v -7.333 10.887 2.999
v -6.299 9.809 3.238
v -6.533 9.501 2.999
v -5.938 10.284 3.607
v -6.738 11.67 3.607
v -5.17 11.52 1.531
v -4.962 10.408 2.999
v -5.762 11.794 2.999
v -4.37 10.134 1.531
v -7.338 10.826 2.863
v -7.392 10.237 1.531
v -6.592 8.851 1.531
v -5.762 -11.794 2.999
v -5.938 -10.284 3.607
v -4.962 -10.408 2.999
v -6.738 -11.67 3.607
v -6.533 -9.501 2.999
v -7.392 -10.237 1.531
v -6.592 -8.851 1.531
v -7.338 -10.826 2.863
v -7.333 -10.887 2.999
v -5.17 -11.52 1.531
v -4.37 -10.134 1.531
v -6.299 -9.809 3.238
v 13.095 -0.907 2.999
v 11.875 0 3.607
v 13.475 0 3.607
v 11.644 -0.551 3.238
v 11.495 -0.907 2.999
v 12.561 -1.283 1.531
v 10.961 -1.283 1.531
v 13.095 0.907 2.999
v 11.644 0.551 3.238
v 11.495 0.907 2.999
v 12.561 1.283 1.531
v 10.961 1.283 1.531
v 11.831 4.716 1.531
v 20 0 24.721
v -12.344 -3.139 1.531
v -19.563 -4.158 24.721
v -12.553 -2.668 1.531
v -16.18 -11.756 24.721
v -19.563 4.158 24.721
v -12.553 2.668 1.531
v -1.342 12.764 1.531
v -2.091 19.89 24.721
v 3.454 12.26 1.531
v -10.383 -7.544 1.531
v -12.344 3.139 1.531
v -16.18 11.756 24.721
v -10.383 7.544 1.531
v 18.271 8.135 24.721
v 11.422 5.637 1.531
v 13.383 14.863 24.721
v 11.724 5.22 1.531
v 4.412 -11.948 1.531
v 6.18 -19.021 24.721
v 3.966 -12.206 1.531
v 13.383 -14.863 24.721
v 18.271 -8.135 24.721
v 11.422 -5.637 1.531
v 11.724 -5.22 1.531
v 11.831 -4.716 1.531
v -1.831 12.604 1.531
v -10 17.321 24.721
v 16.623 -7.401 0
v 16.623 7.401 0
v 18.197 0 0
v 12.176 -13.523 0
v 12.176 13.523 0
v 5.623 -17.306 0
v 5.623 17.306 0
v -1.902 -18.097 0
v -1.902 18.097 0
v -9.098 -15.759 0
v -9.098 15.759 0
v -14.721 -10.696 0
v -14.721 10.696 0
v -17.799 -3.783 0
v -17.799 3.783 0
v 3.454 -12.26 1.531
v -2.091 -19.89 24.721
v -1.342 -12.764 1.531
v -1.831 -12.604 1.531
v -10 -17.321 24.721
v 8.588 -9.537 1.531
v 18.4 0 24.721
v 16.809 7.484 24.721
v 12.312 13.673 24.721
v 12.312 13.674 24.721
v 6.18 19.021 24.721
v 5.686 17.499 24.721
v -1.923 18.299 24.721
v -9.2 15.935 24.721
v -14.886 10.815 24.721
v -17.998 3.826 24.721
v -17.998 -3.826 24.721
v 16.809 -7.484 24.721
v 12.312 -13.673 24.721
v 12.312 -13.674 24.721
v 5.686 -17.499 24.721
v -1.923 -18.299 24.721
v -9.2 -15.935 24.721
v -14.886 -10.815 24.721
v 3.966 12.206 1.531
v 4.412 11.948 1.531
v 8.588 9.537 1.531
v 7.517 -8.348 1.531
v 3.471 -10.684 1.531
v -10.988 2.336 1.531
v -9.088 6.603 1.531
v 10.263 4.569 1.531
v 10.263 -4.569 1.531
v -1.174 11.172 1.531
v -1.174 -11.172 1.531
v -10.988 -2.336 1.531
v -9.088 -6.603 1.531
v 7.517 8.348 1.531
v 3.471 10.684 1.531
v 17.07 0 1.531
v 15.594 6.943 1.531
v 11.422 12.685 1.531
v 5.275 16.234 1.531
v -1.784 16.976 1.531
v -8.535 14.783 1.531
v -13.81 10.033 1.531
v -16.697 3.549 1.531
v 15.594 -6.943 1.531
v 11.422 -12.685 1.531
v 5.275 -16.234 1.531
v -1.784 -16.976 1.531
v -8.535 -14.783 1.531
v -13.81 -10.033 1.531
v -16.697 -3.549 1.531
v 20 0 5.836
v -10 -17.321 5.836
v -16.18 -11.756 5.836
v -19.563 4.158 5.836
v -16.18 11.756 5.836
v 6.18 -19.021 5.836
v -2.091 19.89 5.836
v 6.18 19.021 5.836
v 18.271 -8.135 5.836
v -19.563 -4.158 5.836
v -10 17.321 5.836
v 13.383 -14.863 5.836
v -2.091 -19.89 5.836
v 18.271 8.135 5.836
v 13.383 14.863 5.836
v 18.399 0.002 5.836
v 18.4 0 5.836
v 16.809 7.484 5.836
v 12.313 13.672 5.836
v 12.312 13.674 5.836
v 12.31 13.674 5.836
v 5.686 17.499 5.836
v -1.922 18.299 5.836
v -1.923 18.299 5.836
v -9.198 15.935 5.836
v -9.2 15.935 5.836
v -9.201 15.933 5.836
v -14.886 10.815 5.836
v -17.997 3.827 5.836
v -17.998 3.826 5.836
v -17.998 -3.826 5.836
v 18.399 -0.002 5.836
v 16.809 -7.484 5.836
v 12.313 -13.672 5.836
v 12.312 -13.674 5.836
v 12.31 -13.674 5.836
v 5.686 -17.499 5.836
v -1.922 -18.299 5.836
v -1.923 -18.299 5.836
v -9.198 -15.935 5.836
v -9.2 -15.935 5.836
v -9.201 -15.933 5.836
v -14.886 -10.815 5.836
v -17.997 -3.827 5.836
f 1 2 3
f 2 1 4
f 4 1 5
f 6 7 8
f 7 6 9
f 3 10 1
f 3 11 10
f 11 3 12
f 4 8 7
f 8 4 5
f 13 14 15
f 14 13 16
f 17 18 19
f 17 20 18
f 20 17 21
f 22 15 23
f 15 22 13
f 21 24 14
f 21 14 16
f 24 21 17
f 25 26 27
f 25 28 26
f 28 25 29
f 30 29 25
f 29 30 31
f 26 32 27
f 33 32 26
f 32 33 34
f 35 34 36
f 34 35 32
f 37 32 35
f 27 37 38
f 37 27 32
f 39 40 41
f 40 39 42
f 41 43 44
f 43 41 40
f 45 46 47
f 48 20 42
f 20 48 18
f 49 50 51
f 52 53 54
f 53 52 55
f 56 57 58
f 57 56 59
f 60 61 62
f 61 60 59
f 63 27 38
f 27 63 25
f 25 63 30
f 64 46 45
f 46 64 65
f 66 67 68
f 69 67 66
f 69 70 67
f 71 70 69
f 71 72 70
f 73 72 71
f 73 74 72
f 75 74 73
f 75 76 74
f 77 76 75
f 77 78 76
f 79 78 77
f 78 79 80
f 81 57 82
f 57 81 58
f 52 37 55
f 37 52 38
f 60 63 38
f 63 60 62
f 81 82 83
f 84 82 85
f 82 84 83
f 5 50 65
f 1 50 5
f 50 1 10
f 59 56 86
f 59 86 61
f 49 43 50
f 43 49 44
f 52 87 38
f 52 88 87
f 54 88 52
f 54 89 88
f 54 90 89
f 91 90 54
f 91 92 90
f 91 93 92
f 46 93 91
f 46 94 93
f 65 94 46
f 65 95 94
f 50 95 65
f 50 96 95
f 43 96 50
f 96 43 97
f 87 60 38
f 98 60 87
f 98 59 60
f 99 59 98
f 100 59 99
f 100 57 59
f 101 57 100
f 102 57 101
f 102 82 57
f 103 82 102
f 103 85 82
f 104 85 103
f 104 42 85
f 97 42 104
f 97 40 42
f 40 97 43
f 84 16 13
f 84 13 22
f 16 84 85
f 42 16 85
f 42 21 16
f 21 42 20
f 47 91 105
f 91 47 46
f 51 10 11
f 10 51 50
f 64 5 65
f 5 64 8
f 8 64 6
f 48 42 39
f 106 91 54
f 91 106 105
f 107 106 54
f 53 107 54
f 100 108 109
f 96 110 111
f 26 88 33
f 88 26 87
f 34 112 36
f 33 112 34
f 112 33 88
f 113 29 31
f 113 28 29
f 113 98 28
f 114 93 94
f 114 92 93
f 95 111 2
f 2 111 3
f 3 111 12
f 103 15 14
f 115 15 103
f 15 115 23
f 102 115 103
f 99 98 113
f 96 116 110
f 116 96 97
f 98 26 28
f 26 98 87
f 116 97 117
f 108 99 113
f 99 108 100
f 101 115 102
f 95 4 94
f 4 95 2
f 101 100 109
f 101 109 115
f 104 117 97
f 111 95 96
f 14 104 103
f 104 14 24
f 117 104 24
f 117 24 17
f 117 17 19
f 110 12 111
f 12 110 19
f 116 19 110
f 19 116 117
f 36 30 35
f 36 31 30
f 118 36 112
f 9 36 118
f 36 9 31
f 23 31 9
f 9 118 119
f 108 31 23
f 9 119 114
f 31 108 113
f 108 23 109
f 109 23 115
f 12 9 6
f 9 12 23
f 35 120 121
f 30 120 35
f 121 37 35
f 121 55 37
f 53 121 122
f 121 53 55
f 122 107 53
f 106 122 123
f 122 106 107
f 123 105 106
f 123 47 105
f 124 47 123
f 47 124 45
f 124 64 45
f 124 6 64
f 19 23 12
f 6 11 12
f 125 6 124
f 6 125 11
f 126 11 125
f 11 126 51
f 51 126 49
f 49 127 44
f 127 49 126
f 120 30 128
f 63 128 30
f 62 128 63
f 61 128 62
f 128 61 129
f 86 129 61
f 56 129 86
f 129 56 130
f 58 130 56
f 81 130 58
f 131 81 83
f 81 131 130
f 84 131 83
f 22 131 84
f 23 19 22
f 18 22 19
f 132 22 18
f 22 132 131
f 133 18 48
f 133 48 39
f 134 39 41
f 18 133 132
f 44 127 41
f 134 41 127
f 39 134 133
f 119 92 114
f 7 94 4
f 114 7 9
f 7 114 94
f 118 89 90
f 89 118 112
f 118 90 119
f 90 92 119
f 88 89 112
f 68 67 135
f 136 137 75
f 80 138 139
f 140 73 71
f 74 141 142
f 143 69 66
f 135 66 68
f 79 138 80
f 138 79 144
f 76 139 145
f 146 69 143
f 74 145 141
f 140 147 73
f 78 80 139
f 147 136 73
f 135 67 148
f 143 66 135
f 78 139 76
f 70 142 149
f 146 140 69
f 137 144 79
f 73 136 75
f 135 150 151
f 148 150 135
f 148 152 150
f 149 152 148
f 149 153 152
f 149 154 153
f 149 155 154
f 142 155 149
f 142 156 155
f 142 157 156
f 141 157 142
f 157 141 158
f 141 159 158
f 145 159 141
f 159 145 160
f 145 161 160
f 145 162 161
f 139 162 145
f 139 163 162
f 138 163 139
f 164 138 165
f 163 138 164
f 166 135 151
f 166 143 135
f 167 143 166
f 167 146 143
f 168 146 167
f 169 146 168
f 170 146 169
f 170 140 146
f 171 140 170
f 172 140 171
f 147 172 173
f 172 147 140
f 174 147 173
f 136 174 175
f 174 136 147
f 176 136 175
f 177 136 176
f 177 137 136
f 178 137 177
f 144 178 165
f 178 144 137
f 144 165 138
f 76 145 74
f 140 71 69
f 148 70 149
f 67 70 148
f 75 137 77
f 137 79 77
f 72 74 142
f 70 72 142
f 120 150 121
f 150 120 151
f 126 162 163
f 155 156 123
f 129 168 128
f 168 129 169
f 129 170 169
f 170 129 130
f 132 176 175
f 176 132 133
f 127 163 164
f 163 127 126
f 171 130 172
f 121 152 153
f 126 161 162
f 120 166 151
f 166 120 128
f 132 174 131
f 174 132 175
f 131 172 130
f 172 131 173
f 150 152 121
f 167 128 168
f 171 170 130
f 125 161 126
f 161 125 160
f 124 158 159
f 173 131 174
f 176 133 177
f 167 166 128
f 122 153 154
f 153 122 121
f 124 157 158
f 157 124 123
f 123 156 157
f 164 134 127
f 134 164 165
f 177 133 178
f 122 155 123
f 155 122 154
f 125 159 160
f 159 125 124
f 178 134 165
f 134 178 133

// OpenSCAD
inch=25.4;
gold=1.61803398875;

build_stl=0;
gold_overrides=1;
inch_overrides=0;
shell_mm_overrides=1;
shell_fdm_overrides=1;
match_base_override=1;

halve_override=0;

stl_fineness=210;
low_fineness=15;

nozzle_size=0.4;
layer_height=0.30625;

hole_stl_fineness=90;
hole_low_fineness=8;

holes=3;

taper_pc=0.75;

width_mm=40;
height_mm=40;
cup_height_mm=10;
cup_width_mm=10;
hole_size_mm=8;
wall_thickness_mm=1.6;
floor_thickness_mm=1.53125;

width_inches=1.75;
height_inches=width_inches*gold;
cup_height_inches=0.375;
cup_width_inches=0.5;
hole_size_inches=0.25;
wall_thickness_inches=0.0625;
floor_thickness_inches=0.0625;

wall_thickness_multiple=4;
floor_thickness_multiple=5;

wall_thickness=shell_fdm_overrides?wall_thickness_multiple*nozzle_size:inch_overrides&&!shell_mm_overrides?wall_thickness_inches*inch:wall_thickness_mm;

floor_thickness=shell_fdm_overrides?floor_thickness_multiple*layer_height:inch_overrides&&!shell_mm_overrides?floor_thickness_inches*inch:floor_thickness_mm;

//cup_volume=1.5*15;

width=inch_overrides?width_inches*inch:width_mm;

height=gold_overrides?1/gold*width:inch_overrides?height_inches*inch:height_mm;


taper=gold_overrides?1/gold:taper_pc;

cup_height=gold_overrides?pow(1/gold,4)*width:inch_overrides?cup_height_inches*inch:cup_height_mm;

cup_width=match_base_override?(width-(cup_height/height)*(width-taper*width))-taper*width:gold_overrides?pow(1/gold,3)*width:inch_overrides?cup_width_inches*inch:cup_width_mm;

hole_size=gold_overrides?1/gold*cup_height-floor_thickness:inch_overrides?hole_size_inches*inch:hole_size_mm;



fineness=build_stl?stl_fineness:low_fineness;
hole_fineness=build_stl?hole_stl_fineness:hole_low_fineness;

hole_fineness_offset=(1+floor_thickness/height)*taper*width/2-cos(180/fineness)*(1+floor_thickness/height)*taper*width/2;


hole_offset=sin(asin( (hole_size/2) / ( (taper*width)/2 + ((floor_thickness/height)*taper*width)/2)));


hole_edge=((1+floor_thickness/height)*taper*width-wall_thickness*2)/2-hole_offset*(1+floor_thickness/height)*taper*width/2-hole_fineness_offset;

hole_depth=taper*width/2+hole_offset+((hole_size/2+floor_thickness)/height)*taper*width/2-hole_edge+hole_offset+0.002;


module terracotta_pot(){
    difference(){
        
        cylinder(height,taper*width/2,width/2,$fn=fineness);
        
        translate([0,0,floor_thickness])
        cylinder(height+0.001-floor_thickness,taper*width/2+(floor_thickness/height)*(width-taper*width)/2-wall_thickness,width/2-wall_thickness,$fn=fineness);
        
        for (i=[1:holes]){
            rotate([0,0,360*(i/holes)])
            scale([1,1/gold,1])
            translate([hole_edge-0.001,0,floor_thickness])
            rotate([0,90,0])
            cylinder(hole_depth+0.002,hole_size,hole_size,$fn=hole_fineness);
        }

        if (halve_override){
            translate([0,-width/2-(1+cup_height/height)*taper*width/2,-0.001])
            cube([cup_width/2+width/2+wall_thickness+(1+cup_height/height)*taper*width/2,cup_width+width+(1+cup_height/height)*taper*width+wall_thickness*2,height+0.002]);
        }
    }

    difference(){
        cylinder(cup_height,taper*width/2+cup_width/2,taper*width/2+(cup_height/height)*(1-taper)*width/2+cup_width/2,$fn=fineness);
        
        translate([0,0,floor_thickness])
        cylinder(cup_height+0.001-floor_thickness,taper*width/2+(floor_thickness/height)*(1-taper)*width/2+cup_width/2-wall_thickness,taper*width/2+(cup_height/height)*(width*(1-taper)/2)+cup_width/2-wall_thickness,$fn=fineness);
        
        if (halve_override){
            translate([0,-width/2-(1+cup_height/height)*taper*width/2,-0.001])
            cube([cup_width/2+width/2+wall_thickness+(1+cup_height/height)*taper*width/2,cup_width+width+(1+cup_height/height)*taper*width+wall_thickness*2,height+0.002]);
        }
    }

}

//translate([0,0,-height-0.01])
terracotta_pot();
